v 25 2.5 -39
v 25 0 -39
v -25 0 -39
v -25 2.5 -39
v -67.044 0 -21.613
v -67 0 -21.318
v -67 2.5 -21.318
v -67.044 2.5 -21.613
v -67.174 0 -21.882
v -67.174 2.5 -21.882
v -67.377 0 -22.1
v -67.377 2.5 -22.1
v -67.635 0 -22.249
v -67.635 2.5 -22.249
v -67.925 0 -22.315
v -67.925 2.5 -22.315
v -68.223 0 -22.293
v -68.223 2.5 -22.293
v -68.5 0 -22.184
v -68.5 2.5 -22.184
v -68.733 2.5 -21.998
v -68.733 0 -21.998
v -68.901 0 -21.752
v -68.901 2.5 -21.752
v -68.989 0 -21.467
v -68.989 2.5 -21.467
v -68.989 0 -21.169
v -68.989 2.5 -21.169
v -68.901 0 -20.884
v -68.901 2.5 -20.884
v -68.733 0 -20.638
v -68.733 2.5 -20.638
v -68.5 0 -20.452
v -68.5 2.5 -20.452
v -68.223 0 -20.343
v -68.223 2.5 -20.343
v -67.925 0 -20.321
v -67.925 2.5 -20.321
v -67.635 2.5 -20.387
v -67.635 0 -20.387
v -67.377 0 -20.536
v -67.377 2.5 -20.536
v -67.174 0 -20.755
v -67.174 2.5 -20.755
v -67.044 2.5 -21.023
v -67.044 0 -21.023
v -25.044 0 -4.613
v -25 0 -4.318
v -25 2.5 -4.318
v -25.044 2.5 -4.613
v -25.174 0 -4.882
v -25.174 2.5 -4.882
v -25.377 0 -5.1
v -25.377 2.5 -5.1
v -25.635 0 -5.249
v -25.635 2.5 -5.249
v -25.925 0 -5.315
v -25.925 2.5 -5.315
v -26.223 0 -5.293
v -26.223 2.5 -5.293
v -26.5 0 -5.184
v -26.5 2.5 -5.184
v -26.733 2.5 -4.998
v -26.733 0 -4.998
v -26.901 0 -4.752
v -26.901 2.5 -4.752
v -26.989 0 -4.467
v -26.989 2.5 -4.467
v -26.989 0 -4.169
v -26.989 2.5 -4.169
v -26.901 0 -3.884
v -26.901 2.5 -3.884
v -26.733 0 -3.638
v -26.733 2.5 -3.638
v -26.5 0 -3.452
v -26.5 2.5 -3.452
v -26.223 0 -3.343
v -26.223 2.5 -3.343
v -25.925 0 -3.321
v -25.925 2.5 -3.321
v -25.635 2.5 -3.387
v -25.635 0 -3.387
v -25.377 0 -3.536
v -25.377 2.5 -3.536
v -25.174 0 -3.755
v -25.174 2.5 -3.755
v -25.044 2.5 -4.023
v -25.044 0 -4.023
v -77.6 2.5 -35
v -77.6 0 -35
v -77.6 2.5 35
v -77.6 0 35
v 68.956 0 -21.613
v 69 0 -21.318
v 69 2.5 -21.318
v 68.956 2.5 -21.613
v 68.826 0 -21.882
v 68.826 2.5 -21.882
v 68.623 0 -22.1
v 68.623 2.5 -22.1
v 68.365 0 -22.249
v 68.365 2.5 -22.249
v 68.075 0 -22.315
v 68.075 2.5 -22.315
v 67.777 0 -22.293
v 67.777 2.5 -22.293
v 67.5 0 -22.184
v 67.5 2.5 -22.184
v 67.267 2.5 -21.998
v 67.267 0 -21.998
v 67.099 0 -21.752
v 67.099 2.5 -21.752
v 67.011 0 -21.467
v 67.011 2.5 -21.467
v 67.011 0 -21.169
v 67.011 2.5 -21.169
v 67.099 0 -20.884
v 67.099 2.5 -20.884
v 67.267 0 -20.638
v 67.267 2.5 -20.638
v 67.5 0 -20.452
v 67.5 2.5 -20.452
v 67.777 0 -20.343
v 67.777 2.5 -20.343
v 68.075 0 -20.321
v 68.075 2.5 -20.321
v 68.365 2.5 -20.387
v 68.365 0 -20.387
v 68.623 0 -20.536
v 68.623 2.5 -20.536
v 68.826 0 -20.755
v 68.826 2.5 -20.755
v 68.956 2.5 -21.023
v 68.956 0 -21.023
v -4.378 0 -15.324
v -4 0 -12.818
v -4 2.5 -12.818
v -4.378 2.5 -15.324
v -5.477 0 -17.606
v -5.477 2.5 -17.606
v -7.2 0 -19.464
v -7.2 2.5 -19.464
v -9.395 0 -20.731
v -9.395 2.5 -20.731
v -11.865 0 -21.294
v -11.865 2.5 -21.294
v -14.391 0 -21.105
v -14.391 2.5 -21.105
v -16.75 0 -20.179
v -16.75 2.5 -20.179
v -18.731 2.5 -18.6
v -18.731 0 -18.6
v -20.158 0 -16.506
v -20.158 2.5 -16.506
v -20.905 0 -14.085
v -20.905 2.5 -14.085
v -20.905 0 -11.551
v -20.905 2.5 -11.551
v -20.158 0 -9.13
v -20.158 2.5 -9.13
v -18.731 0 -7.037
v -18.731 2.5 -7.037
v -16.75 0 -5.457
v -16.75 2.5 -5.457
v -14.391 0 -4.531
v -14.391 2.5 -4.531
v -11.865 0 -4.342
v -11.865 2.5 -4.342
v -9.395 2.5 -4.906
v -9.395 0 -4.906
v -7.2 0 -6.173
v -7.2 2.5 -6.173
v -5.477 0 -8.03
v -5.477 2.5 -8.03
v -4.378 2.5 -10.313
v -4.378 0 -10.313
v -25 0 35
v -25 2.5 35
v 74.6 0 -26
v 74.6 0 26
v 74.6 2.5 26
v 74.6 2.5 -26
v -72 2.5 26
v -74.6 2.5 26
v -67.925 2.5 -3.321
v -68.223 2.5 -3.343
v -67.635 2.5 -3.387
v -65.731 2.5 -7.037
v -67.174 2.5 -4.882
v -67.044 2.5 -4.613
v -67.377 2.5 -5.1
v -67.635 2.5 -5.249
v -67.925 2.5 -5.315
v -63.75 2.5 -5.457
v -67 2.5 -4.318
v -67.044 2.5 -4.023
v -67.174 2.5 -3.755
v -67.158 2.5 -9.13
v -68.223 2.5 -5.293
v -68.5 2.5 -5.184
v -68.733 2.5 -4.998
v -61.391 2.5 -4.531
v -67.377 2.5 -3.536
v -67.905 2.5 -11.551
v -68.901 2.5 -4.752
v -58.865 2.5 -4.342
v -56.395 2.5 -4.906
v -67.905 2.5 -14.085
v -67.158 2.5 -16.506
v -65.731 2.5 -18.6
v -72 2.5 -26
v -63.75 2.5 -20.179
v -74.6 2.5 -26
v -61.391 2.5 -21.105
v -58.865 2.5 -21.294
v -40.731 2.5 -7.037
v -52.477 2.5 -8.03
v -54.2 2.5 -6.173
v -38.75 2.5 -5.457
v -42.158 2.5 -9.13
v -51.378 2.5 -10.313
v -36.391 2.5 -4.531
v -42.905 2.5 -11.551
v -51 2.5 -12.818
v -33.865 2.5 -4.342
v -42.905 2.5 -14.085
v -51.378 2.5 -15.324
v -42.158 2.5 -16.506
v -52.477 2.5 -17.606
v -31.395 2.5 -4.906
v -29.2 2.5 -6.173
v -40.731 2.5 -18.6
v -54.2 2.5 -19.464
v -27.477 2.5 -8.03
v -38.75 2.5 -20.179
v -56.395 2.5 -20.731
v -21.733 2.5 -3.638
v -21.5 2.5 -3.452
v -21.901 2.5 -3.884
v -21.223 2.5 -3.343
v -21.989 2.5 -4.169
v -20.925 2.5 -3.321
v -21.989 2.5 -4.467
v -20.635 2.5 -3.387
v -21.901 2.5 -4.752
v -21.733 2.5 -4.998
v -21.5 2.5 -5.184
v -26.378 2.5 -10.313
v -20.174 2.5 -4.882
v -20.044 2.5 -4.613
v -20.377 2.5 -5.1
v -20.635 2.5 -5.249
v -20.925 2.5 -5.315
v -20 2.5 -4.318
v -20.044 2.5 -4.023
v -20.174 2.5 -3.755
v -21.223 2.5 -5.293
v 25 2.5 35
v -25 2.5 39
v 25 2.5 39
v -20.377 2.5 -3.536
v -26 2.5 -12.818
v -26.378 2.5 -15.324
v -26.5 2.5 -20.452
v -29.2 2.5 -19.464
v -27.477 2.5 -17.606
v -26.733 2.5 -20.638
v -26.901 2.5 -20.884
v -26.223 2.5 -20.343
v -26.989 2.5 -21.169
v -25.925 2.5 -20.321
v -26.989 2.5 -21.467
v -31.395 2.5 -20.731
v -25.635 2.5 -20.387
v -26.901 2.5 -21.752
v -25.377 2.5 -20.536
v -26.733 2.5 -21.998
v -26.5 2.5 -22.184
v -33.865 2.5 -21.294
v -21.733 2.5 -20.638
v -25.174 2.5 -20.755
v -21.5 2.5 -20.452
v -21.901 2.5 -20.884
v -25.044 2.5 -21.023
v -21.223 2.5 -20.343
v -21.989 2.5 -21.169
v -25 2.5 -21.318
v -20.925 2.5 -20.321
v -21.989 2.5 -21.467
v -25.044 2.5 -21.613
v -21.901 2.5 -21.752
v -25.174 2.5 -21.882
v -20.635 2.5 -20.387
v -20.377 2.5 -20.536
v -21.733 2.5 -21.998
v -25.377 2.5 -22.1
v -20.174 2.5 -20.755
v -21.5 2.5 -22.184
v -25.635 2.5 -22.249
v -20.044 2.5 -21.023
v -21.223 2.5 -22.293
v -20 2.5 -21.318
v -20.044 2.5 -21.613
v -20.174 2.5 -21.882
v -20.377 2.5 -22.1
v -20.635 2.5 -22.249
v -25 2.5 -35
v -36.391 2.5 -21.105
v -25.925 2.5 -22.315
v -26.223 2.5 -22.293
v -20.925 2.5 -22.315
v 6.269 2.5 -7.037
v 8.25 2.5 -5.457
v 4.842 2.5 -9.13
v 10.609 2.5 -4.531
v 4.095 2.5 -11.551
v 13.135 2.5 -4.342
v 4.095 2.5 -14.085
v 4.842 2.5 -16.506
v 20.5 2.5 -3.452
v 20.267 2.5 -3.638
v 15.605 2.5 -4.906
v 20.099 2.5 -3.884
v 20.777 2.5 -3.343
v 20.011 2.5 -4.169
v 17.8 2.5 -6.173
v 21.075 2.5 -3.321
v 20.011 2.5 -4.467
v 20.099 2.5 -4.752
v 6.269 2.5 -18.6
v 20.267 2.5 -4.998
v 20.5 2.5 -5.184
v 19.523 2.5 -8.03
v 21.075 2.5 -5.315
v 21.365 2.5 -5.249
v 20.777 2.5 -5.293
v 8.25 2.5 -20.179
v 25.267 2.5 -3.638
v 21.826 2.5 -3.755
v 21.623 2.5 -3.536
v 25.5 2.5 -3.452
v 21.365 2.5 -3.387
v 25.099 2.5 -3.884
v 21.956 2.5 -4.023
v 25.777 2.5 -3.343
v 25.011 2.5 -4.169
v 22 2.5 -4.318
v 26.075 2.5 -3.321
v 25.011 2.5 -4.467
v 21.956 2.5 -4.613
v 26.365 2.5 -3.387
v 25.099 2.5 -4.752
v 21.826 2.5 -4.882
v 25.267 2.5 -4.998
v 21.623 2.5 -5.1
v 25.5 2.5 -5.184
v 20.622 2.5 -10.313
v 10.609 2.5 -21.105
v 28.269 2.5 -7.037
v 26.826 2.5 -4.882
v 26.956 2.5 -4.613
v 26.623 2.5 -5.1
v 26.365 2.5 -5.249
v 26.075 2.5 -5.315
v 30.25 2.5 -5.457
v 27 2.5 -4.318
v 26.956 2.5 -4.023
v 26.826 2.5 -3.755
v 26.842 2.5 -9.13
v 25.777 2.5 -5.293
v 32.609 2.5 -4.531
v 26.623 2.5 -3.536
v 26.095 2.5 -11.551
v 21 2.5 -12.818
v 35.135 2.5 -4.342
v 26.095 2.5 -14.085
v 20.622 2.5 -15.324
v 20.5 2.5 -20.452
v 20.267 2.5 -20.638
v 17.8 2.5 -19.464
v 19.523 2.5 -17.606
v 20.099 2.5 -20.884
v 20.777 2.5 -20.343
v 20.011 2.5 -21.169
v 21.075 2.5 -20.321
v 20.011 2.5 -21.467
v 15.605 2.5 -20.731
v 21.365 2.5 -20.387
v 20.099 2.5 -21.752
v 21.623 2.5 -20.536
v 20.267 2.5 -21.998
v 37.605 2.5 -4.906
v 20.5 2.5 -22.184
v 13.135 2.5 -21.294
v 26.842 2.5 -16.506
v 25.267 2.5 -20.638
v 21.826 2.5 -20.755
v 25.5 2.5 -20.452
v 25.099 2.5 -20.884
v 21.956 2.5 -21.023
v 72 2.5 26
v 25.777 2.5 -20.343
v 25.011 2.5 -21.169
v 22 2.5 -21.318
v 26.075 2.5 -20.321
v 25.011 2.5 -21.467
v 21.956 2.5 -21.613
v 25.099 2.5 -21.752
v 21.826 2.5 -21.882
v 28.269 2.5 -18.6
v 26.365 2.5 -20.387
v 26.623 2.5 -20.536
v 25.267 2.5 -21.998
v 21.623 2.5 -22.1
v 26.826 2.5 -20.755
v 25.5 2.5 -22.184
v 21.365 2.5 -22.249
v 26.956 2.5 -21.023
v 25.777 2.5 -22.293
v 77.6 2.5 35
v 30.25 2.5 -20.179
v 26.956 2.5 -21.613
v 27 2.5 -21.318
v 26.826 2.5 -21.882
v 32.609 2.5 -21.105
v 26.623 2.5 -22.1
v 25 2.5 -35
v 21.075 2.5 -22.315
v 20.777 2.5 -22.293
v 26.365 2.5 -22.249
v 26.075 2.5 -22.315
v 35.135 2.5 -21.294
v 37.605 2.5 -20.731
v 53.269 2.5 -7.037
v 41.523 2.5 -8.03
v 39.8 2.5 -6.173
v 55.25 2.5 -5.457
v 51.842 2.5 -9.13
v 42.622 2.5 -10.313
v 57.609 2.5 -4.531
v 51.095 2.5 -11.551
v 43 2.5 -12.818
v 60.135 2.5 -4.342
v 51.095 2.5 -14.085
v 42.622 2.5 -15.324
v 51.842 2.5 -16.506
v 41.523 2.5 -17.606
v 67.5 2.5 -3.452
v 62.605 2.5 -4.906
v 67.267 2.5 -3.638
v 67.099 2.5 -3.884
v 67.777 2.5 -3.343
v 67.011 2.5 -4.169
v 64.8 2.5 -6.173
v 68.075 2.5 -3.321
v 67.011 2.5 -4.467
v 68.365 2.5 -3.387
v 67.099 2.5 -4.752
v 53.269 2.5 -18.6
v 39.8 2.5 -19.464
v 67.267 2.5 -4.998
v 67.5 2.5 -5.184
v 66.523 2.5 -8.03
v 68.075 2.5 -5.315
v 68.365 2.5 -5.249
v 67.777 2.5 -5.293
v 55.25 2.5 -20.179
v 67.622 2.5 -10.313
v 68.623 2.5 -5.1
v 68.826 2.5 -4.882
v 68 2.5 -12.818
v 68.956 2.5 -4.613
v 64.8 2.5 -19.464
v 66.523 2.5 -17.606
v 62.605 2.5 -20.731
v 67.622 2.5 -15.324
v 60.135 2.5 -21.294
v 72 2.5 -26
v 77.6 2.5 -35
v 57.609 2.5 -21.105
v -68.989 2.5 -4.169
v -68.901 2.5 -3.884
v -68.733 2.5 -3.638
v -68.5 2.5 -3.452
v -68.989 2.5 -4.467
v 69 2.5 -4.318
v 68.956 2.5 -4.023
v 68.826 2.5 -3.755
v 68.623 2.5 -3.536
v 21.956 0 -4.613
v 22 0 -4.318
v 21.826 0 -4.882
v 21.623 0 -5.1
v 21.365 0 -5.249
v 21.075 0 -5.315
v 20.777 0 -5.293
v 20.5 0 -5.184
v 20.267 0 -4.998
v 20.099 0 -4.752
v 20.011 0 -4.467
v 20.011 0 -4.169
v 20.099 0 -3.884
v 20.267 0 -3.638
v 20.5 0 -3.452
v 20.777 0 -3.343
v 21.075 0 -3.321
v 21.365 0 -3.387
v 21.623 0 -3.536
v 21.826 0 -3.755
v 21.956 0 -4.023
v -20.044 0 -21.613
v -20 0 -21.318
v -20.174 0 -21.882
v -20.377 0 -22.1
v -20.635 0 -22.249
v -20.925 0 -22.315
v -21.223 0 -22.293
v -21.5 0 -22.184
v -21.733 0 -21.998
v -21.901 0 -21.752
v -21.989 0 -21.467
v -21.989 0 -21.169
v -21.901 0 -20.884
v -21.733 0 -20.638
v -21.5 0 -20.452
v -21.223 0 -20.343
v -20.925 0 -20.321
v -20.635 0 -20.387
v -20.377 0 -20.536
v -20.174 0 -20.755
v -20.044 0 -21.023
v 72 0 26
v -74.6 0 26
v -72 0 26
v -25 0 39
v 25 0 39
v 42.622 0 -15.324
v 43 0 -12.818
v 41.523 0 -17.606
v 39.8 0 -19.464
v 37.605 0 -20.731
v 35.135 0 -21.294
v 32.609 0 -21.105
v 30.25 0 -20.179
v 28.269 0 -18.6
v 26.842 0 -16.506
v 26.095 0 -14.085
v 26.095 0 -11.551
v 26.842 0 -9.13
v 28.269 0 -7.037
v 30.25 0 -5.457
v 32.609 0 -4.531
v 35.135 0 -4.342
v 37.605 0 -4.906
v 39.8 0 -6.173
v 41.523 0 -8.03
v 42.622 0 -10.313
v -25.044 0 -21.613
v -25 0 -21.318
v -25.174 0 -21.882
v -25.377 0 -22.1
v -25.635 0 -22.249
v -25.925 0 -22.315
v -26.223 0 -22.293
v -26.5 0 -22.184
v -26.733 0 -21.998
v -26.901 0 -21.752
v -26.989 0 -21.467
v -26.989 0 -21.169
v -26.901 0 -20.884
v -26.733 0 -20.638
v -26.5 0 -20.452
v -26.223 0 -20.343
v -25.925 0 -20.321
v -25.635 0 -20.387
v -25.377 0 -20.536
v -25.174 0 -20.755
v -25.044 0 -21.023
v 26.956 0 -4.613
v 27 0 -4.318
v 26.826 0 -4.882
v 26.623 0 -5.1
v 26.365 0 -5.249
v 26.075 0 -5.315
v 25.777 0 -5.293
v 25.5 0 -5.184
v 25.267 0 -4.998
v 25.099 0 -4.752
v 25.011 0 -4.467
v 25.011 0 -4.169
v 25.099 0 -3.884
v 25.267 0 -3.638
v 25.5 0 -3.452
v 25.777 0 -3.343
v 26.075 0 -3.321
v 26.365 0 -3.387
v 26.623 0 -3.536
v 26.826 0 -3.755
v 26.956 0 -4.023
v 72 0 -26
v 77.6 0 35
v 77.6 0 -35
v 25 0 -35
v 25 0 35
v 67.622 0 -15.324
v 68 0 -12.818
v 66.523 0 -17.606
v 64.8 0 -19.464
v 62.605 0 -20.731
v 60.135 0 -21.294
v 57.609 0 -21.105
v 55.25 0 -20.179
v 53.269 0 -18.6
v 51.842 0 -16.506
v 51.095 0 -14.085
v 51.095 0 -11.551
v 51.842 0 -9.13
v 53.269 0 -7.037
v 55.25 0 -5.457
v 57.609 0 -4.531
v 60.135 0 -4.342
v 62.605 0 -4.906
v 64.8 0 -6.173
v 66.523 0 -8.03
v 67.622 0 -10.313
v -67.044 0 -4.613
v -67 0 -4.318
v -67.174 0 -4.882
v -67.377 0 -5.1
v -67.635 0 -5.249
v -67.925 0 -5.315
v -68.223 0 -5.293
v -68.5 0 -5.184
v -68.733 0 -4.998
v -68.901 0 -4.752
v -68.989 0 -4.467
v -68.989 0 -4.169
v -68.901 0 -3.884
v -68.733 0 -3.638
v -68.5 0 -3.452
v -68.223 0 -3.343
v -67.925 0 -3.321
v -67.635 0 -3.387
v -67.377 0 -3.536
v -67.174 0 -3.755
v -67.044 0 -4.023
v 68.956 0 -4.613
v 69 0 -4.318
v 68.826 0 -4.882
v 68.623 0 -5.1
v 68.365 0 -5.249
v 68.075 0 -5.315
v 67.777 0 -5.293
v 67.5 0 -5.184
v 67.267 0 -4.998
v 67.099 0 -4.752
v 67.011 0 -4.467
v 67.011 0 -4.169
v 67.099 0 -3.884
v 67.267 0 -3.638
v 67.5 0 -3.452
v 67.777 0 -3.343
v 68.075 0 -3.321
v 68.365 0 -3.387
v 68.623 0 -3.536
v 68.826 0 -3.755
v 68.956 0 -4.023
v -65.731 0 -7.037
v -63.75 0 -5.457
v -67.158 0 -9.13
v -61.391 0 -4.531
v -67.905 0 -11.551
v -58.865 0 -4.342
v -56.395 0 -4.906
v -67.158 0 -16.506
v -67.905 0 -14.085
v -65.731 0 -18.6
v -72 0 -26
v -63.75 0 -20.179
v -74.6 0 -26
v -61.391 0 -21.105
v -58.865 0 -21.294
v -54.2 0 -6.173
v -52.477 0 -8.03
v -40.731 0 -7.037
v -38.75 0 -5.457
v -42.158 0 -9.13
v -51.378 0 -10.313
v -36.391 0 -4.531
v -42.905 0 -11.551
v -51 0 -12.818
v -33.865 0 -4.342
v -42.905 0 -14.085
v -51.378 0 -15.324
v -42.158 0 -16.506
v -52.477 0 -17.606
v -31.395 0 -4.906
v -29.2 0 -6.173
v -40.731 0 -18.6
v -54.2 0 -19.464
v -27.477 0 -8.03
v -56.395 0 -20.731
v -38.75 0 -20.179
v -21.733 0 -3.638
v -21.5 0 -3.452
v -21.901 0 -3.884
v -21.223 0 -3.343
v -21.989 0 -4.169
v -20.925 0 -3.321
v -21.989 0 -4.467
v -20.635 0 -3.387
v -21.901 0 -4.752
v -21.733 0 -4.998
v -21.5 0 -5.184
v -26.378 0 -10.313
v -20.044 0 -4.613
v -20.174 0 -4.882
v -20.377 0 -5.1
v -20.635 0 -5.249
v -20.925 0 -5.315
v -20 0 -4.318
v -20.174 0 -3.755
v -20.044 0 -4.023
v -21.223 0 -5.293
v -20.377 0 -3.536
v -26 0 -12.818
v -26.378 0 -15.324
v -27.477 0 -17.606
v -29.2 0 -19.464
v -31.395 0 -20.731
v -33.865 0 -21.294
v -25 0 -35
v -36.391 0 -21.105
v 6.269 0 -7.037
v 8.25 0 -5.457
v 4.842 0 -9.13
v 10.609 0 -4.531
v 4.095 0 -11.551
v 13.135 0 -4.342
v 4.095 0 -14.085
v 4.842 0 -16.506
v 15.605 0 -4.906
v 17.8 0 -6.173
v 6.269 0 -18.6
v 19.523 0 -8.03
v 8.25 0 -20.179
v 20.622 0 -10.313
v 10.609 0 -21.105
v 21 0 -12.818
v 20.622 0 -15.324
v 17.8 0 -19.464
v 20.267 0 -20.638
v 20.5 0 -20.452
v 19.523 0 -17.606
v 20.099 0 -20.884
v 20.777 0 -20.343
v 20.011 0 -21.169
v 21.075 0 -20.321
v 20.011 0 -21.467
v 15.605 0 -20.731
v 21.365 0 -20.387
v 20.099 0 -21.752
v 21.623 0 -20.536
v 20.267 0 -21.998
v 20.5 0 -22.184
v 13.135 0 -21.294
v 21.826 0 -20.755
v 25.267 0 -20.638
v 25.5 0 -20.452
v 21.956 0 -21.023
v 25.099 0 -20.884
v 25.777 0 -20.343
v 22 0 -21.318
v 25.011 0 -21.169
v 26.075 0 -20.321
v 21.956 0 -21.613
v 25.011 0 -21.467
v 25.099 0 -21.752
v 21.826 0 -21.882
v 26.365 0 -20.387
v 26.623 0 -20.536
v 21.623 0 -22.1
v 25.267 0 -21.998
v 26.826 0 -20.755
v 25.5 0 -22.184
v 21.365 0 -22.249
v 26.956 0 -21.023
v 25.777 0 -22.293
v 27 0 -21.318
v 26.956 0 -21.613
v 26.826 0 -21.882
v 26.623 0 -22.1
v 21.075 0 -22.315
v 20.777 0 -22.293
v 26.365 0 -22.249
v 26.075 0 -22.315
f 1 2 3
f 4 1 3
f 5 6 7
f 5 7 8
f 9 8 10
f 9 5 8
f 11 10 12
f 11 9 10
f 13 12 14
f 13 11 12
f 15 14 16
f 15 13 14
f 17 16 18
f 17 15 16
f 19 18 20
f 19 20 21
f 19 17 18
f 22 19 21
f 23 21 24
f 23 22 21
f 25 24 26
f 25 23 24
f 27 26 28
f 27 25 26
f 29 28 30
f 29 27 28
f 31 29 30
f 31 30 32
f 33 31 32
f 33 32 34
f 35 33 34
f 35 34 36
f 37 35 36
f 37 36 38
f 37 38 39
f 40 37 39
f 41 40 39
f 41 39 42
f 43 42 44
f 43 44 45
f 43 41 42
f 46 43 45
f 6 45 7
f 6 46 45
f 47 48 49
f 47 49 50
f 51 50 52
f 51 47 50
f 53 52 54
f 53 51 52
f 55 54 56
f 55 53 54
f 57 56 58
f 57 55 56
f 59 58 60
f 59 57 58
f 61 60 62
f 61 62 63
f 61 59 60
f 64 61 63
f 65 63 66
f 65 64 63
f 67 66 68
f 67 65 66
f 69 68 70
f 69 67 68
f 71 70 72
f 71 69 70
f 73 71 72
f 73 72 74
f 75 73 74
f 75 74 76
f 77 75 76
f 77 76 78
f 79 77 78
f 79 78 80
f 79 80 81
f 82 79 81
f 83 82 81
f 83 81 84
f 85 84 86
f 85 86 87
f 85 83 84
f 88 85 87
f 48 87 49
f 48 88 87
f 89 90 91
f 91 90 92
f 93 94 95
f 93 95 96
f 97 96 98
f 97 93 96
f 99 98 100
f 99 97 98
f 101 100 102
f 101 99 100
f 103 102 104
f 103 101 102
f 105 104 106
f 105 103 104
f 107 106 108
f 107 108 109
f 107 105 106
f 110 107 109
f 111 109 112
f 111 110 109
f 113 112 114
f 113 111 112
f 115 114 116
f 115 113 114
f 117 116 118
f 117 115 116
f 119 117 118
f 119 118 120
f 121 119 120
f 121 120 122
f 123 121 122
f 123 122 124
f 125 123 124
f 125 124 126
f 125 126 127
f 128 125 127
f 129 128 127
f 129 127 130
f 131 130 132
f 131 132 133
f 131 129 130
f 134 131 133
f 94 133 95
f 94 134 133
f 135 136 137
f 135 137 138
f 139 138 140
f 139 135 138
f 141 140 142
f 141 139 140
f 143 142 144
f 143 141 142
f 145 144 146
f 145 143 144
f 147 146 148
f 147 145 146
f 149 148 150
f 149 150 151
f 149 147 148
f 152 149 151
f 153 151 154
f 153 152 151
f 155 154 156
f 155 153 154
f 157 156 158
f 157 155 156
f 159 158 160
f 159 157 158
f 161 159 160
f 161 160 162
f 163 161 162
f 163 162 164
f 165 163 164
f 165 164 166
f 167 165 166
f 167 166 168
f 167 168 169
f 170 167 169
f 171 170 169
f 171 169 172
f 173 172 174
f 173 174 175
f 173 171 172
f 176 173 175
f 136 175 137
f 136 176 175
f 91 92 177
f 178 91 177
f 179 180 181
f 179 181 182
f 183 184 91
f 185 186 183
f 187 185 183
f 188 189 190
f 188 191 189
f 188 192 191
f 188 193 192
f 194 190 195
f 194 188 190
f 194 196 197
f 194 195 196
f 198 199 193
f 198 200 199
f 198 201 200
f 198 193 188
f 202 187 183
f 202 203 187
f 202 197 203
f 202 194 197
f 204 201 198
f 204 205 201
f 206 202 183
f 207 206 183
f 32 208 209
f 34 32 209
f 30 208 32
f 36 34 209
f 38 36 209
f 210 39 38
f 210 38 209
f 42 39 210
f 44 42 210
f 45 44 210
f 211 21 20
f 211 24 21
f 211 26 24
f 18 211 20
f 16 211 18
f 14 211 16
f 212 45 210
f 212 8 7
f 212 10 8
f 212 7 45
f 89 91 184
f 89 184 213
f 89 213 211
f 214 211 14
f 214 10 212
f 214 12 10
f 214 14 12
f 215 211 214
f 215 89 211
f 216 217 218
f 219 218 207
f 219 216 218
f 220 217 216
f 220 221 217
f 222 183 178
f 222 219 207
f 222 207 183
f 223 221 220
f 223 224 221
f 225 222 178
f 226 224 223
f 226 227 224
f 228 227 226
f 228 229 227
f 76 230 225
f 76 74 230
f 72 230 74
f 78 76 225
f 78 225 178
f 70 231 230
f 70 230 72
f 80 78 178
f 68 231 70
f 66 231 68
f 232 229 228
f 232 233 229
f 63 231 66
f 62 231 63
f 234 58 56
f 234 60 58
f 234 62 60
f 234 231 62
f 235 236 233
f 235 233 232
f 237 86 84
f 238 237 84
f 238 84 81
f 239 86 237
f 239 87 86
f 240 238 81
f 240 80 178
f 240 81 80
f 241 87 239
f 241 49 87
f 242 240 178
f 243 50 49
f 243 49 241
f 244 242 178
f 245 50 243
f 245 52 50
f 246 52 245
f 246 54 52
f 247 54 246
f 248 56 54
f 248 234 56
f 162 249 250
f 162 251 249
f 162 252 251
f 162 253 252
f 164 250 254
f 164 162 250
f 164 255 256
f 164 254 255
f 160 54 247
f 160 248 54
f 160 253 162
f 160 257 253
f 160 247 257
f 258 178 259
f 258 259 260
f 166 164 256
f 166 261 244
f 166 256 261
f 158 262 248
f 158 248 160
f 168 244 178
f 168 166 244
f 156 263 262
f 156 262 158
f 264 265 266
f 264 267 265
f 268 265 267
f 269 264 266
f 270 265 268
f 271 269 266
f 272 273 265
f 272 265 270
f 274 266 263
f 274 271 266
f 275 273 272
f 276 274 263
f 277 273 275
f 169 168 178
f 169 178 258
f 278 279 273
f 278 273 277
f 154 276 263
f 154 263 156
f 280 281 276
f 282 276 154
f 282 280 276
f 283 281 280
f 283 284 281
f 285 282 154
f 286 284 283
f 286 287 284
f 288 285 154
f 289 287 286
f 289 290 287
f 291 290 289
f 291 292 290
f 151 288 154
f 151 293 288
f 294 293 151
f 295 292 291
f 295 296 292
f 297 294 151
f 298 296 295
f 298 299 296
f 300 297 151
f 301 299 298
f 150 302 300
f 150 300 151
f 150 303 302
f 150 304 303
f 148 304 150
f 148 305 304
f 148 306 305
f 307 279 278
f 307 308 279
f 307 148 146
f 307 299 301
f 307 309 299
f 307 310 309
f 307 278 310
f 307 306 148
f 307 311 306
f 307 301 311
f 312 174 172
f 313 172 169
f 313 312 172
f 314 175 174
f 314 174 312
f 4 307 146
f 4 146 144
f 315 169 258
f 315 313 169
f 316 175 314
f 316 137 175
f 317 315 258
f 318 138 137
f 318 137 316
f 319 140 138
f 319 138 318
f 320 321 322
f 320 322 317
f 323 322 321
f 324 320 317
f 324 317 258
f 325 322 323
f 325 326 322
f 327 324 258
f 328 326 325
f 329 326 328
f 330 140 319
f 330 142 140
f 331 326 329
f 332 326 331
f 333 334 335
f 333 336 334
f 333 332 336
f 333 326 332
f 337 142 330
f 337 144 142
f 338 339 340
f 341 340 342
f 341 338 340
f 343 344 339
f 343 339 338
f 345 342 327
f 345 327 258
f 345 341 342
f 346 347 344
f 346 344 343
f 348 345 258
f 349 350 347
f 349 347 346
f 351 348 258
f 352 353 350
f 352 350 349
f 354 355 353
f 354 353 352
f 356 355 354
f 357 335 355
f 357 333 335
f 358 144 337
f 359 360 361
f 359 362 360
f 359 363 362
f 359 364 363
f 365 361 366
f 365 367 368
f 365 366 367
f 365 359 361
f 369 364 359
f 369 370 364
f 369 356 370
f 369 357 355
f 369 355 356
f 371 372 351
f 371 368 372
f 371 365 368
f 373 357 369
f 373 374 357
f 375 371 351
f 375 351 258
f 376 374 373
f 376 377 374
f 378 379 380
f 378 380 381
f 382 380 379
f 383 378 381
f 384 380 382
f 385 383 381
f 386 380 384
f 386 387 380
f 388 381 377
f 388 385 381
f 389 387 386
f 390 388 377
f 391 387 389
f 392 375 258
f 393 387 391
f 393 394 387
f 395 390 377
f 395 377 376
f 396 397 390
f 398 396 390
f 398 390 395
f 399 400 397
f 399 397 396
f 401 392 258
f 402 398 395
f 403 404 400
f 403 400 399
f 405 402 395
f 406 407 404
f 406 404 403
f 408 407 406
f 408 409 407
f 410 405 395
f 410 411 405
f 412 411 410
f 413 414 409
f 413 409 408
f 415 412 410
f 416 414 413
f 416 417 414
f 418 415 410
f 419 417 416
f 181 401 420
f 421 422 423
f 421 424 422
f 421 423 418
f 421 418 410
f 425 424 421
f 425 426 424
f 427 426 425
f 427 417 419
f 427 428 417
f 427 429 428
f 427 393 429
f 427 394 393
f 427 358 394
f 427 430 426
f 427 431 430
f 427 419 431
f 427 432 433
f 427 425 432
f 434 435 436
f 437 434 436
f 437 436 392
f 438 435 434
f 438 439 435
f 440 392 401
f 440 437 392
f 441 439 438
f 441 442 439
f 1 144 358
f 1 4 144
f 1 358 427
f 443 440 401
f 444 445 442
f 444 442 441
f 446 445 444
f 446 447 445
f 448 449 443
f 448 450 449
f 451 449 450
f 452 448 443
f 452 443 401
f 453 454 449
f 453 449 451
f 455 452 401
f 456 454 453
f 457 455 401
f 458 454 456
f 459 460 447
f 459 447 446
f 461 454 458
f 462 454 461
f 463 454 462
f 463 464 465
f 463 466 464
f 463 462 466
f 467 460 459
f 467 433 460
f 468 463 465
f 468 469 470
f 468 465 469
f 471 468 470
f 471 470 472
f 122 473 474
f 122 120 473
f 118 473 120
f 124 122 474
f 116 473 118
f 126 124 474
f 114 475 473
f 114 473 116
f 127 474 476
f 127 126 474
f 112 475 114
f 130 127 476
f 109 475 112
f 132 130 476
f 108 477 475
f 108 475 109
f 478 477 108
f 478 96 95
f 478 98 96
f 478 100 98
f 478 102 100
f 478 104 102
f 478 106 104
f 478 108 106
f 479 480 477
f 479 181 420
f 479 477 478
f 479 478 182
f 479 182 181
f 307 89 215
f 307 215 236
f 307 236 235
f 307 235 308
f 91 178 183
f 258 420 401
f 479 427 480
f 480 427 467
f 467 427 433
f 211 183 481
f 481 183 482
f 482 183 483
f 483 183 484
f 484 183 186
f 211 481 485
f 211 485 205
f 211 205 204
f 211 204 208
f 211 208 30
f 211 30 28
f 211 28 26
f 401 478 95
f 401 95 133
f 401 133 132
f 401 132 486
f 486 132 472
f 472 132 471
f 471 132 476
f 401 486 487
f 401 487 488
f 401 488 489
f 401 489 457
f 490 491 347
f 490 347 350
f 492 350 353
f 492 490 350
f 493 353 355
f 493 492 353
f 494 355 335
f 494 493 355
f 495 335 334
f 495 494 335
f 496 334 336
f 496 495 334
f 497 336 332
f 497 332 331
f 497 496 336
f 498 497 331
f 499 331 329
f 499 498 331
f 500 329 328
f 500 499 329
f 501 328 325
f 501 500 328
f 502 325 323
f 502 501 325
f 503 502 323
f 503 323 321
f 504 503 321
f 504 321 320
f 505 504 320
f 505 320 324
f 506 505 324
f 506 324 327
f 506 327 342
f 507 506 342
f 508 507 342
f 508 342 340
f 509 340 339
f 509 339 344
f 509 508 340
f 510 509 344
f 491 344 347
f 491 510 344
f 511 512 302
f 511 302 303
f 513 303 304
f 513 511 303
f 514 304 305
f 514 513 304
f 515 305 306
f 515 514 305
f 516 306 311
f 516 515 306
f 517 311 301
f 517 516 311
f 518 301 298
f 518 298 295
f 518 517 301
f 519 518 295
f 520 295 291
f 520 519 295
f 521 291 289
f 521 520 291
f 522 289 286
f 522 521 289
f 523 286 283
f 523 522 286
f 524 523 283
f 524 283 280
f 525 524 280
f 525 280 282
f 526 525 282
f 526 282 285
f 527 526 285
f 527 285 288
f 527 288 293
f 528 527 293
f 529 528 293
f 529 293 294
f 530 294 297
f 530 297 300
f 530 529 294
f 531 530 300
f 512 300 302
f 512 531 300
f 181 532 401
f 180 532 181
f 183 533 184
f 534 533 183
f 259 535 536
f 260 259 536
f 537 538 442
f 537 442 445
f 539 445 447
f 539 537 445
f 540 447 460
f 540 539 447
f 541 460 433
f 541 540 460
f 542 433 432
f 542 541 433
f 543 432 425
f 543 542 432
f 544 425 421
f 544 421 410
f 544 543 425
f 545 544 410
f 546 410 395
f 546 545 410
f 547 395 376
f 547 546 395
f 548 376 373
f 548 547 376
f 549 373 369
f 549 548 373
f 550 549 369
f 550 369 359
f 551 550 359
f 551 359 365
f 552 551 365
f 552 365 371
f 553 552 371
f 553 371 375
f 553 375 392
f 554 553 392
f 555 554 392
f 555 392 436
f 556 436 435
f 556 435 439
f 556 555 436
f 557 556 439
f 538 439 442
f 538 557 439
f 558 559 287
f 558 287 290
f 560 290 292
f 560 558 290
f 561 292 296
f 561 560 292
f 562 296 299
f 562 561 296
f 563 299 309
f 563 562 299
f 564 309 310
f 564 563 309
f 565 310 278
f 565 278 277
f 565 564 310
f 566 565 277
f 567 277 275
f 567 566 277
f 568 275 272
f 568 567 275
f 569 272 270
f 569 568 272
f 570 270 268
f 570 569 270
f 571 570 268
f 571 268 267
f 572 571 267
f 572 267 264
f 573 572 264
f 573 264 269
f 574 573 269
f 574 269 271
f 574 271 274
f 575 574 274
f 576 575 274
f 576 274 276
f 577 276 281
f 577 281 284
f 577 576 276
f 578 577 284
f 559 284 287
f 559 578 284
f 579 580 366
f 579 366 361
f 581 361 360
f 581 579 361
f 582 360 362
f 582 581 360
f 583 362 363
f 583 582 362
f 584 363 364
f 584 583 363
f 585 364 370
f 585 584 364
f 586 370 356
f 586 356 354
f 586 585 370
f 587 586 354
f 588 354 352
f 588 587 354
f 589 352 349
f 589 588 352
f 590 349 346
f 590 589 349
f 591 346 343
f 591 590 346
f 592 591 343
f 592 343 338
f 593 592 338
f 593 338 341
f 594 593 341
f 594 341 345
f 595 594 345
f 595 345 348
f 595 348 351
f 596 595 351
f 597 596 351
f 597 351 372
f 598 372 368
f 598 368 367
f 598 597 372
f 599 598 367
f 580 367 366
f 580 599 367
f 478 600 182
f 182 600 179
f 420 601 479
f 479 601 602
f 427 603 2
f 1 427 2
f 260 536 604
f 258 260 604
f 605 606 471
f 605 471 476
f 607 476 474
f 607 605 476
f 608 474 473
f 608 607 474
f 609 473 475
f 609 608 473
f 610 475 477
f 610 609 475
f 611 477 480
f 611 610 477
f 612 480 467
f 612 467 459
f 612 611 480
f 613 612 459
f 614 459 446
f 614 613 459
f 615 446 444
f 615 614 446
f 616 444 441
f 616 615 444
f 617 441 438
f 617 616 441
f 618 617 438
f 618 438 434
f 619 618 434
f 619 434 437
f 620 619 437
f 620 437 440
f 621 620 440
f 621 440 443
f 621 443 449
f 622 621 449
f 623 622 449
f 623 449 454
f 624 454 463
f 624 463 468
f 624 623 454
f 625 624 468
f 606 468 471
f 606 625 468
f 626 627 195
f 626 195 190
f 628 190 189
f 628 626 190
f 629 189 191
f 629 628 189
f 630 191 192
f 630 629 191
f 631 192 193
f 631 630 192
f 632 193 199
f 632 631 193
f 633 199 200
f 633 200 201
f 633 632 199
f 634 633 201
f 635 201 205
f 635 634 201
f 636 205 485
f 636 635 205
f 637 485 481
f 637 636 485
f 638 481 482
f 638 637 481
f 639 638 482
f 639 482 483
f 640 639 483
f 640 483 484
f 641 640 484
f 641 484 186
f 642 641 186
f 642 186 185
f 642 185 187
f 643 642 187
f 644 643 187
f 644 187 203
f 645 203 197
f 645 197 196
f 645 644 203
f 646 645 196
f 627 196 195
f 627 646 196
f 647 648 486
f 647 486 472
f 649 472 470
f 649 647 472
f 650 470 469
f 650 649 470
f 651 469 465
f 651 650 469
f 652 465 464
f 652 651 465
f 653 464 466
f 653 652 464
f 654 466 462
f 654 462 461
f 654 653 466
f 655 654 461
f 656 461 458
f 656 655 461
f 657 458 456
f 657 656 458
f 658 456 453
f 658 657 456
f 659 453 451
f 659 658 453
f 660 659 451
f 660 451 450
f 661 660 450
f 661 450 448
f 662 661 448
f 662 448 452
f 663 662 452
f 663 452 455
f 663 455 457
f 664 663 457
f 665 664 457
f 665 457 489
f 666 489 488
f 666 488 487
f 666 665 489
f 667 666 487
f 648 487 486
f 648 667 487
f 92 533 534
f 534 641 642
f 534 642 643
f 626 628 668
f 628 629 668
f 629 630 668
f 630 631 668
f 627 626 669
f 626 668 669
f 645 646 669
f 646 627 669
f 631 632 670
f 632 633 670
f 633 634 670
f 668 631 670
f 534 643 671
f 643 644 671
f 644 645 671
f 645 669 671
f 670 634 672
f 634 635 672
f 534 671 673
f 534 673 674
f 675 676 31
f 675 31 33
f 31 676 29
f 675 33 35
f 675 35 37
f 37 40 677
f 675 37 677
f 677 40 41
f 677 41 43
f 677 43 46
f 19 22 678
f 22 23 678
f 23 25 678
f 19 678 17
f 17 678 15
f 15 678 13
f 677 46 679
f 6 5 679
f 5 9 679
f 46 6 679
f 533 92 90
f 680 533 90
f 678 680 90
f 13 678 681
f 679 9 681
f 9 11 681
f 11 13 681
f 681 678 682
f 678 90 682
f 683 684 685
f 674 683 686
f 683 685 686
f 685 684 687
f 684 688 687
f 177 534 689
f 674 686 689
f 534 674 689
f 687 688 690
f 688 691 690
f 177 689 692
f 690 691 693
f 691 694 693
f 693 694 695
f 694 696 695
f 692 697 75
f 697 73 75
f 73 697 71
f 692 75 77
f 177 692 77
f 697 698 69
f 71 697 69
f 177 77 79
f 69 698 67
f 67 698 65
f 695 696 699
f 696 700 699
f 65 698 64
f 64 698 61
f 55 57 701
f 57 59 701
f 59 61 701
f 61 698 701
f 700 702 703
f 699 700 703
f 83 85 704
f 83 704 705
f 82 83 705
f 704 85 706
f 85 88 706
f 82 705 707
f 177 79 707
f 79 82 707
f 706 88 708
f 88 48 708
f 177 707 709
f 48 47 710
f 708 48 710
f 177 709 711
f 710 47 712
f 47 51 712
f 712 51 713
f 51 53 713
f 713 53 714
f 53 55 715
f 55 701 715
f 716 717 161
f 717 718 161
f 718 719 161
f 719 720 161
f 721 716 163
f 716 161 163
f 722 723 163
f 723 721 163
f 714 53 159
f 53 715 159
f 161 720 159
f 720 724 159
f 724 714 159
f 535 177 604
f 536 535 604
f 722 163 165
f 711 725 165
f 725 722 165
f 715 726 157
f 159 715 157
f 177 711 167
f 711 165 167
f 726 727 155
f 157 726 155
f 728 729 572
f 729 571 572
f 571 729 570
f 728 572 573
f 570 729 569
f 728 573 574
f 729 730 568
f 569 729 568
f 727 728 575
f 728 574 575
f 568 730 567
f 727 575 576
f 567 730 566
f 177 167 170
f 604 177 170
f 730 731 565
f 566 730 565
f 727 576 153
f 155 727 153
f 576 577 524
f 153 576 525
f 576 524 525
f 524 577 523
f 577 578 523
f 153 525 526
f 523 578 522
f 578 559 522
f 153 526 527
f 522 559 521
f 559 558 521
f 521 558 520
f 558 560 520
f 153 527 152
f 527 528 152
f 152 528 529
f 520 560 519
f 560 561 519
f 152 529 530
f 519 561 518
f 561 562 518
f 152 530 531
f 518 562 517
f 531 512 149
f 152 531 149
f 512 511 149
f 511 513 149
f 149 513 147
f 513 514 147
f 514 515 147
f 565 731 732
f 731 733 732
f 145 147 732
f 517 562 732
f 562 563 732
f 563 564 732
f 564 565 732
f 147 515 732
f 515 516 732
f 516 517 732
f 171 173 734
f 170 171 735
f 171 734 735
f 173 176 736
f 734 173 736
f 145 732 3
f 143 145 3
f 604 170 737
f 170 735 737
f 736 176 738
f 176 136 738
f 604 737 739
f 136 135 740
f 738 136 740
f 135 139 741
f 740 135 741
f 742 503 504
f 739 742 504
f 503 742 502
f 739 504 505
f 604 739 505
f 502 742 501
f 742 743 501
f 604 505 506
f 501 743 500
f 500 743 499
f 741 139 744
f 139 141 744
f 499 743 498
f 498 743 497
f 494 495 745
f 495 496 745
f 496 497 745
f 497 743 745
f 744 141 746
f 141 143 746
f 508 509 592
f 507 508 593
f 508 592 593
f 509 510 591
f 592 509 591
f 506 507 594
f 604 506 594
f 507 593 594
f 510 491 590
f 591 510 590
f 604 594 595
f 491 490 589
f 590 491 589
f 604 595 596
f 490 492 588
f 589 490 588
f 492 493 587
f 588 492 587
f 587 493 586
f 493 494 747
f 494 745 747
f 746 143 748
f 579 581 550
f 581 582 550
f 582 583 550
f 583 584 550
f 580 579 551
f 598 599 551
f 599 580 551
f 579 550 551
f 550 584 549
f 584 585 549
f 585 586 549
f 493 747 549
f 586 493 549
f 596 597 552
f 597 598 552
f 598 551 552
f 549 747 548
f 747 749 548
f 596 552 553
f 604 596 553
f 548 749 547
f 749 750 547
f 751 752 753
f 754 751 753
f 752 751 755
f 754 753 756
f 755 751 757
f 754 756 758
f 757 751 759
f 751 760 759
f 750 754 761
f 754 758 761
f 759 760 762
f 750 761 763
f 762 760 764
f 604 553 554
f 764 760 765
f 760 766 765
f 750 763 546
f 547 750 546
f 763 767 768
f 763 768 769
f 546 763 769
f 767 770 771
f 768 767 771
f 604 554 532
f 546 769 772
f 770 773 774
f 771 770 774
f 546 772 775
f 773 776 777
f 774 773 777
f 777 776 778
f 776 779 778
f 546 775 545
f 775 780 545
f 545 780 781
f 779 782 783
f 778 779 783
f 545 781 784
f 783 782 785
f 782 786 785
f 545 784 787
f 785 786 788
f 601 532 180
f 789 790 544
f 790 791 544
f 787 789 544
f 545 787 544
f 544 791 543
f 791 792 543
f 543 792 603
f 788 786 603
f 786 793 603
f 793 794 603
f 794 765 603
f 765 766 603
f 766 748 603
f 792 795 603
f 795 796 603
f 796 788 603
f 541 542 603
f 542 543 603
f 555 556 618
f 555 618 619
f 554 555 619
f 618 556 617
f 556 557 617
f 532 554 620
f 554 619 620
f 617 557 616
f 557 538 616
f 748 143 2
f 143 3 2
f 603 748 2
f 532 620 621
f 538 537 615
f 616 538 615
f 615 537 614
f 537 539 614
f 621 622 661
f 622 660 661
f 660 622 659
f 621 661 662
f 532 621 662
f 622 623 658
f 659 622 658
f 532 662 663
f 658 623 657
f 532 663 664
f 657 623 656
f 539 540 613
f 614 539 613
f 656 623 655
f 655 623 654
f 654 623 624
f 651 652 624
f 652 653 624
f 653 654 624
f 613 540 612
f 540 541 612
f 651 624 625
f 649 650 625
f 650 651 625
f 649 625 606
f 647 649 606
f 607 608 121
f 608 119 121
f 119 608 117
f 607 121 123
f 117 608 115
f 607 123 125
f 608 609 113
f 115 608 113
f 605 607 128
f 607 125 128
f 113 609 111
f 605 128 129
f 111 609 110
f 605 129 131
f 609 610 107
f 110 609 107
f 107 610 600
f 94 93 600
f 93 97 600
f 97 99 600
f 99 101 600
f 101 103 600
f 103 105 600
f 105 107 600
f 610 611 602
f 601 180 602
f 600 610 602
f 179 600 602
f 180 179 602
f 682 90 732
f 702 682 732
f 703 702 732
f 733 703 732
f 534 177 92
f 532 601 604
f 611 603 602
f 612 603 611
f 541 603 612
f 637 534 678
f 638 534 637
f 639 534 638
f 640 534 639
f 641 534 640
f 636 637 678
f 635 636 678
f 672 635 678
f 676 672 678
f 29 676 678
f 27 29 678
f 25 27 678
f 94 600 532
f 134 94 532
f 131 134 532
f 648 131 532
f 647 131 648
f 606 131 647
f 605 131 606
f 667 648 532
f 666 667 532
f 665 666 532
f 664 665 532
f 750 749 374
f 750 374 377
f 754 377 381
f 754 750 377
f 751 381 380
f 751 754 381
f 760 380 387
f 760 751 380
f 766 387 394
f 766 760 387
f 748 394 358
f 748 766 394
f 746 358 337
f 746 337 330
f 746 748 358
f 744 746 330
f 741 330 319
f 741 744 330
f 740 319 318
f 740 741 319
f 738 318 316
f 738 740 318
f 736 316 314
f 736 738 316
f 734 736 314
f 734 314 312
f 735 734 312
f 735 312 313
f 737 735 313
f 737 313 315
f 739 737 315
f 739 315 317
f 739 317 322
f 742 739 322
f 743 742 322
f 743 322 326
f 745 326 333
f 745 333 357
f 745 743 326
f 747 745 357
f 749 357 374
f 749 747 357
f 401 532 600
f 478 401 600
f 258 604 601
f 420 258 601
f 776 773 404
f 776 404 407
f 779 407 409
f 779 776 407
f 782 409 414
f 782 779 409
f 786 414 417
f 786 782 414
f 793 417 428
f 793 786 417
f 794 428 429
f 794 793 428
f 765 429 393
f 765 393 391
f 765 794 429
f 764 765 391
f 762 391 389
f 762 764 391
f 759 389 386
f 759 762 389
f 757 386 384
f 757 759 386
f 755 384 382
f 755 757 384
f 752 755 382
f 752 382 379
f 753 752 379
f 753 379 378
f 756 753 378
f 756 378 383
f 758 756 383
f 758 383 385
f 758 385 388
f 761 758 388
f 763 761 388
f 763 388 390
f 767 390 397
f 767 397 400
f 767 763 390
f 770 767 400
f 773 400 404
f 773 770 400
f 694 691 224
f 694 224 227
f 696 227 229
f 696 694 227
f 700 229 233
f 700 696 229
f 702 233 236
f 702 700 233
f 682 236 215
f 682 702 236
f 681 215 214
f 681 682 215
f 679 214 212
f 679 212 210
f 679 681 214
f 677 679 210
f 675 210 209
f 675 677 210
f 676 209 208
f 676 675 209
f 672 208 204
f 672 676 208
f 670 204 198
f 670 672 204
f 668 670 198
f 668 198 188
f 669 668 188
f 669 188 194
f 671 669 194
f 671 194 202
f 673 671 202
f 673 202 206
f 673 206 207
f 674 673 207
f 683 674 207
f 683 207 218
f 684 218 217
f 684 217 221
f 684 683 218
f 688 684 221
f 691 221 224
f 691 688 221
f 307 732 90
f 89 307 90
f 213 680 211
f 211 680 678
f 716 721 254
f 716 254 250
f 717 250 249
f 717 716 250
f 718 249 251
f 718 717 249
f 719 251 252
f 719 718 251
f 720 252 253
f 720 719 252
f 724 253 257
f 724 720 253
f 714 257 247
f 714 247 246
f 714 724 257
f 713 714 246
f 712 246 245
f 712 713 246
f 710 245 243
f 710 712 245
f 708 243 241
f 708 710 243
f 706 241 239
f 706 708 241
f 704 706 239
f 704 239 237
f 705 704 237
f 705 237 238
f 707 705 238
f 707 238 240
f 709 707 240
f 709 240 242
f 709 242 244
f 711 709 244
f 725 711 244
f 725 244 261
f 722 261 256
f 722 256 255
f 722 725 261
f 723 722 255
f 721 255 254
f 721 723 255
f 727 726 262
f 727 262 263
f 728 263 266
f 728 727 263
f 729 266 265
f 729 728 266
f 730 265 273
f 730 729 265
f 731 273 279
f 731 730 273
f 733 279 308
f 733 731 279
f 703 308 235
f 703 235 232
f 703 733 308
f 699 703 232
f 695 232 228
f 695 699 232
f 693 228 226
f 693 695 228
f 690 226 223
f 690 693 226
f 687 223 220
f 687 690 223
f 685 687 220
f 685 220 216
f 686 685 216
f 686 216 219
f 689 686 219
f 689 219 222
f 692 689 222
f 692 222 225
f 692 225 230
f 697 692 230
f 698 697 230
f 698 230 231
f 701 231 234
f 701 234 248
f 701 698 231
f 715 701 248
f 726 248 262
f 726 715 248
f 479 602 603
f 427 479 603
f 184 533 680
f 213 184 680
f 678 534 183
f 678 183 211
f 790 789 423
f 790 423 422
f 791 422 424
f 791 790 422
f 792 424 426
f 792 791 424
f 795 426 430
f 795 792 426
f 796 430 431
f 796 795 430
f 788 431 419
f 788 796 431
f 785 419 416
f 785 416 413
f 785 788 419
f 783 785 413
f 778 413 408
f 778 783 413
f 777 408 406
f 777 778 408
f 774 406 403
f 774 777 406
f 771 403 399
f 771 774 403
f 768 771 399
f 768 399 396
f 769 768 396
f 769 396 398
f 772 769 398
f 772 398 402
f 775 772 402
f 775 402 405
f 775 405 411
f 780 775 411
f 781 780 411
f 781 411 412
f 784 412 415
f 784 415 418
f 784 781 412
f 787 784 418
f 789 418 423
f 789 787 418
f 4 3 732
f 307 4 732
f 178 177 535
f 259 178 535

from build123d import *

# Parameters (mm, degrees)
SKETCH1_R           = 8.5
SKETCH1_R_2         = 1
SKETCH1_W           = 2.6
SKETCH1_H           = 52
BOSS_EXTRUDE1_DEPTH = 2.5


with BuildPart() as part:
    # Sketch1 → Boss-Extrude1 (new body)
    with BuildSketch(Plane(origin=(0, 0, 0), x_dir=(1, 0, 0), z_dir=(0, 1, 0))):
        Polygon((-25, 35), (-77.6, 35), (-77.6, -35), (-25, -35), (-25, -39), (25, -39), (25, -35), (77.6, -35), (77.6, 35), (25, 35), (25, 39), (-25, 39), align=None)
        with Locations((-12.5, 12.818198975)):
            Circle(SKETCH1_R, mode=Mode.SUBTRACT)
        with Locations((-21, 21.318198975)):
            Circle(SKETCH1_R_2, mode=Mode.SUBTRACT)
        with Locations((-21, 4.318198975)):
            Circle(SKETCH1_R_2, mode=Mode.SUBTRACT)
        with Locations((21, 4.318198975)):
            Circle(SKETCH1_R_2, mode=Mode.SUBTRACT)
        with Locations((21, 21.318198975)):
            Circle(SKETCH1_R_2, mode=Mode.SUBTRACT)
        with Locations((12.5, 12.818198975)):
            Circle(SKETCH1_R, mode=Mode.SUBTRACT)
        with Locations((26, 4.318198975)):
            Circle(SKETCH1_R_2, mode=Mode.SUBTRACT)
        with Locations((34.5, 12.818198975)):
            Circle(SKETCH1_R, mode=Mode.SUBTRACT)
        with Locations((26, 21.318198975)):
            Circle(SKETCH1_R_2, mode=Mode.SUBTRACT)
        with Locations((68, 21.318198975)):
            Circle(SKETCH1_R_2, mode=Mode.SUBTRACT)
        with Locations((68, 4.318198975)):
            Circle(SKETCH1_R_2, mode=Mode.SUBTRACT)
        with Locations((59.5, 12.818198975)):
            Circle(SKETCH1_R, mode=Mode.SUBTRACT)
        with Locations((-68, 4.318198975)):
            Circle(SKETCH1_R_2, mode=Mode.SUBTRACT)
        with Locations((-59.5, 12.818198975)):
            Circle(SKETCH1_R, mode=Mode.SUBTRACT)
        with Locations((-34.5, 12.818198975)):
            Circle(SKETCH1_R, mode=Mode.SUBTRACT)
        with Locations((-26, 21.318198975)):
            Circle(SKETCH1_R_2, mode=Mode.SUBTRACT)
        with Locations((-26, 4.318198975)):
            Circle(SKETCH1_R_2, mode=Mode.SUBTRACT)
        with Locations((-68, 21.318198975)):
            Circle(SKETCH1_R_2, mode=Mode.SUBTRACT)
        with Locations((-73.3, 0)):
            Rectangle(SKETCH1_W, SKETCH1_H, mode=Mode.SUBTRACT)
        with Locations((73.3, 0)):
            Rectangle(SKETCH1_W, SKETCH1_H, mode=Mode.SUBTRACT)
    extrude(amount=BOSS_EXTRUDE1_DEPTH)


solid = part.part
